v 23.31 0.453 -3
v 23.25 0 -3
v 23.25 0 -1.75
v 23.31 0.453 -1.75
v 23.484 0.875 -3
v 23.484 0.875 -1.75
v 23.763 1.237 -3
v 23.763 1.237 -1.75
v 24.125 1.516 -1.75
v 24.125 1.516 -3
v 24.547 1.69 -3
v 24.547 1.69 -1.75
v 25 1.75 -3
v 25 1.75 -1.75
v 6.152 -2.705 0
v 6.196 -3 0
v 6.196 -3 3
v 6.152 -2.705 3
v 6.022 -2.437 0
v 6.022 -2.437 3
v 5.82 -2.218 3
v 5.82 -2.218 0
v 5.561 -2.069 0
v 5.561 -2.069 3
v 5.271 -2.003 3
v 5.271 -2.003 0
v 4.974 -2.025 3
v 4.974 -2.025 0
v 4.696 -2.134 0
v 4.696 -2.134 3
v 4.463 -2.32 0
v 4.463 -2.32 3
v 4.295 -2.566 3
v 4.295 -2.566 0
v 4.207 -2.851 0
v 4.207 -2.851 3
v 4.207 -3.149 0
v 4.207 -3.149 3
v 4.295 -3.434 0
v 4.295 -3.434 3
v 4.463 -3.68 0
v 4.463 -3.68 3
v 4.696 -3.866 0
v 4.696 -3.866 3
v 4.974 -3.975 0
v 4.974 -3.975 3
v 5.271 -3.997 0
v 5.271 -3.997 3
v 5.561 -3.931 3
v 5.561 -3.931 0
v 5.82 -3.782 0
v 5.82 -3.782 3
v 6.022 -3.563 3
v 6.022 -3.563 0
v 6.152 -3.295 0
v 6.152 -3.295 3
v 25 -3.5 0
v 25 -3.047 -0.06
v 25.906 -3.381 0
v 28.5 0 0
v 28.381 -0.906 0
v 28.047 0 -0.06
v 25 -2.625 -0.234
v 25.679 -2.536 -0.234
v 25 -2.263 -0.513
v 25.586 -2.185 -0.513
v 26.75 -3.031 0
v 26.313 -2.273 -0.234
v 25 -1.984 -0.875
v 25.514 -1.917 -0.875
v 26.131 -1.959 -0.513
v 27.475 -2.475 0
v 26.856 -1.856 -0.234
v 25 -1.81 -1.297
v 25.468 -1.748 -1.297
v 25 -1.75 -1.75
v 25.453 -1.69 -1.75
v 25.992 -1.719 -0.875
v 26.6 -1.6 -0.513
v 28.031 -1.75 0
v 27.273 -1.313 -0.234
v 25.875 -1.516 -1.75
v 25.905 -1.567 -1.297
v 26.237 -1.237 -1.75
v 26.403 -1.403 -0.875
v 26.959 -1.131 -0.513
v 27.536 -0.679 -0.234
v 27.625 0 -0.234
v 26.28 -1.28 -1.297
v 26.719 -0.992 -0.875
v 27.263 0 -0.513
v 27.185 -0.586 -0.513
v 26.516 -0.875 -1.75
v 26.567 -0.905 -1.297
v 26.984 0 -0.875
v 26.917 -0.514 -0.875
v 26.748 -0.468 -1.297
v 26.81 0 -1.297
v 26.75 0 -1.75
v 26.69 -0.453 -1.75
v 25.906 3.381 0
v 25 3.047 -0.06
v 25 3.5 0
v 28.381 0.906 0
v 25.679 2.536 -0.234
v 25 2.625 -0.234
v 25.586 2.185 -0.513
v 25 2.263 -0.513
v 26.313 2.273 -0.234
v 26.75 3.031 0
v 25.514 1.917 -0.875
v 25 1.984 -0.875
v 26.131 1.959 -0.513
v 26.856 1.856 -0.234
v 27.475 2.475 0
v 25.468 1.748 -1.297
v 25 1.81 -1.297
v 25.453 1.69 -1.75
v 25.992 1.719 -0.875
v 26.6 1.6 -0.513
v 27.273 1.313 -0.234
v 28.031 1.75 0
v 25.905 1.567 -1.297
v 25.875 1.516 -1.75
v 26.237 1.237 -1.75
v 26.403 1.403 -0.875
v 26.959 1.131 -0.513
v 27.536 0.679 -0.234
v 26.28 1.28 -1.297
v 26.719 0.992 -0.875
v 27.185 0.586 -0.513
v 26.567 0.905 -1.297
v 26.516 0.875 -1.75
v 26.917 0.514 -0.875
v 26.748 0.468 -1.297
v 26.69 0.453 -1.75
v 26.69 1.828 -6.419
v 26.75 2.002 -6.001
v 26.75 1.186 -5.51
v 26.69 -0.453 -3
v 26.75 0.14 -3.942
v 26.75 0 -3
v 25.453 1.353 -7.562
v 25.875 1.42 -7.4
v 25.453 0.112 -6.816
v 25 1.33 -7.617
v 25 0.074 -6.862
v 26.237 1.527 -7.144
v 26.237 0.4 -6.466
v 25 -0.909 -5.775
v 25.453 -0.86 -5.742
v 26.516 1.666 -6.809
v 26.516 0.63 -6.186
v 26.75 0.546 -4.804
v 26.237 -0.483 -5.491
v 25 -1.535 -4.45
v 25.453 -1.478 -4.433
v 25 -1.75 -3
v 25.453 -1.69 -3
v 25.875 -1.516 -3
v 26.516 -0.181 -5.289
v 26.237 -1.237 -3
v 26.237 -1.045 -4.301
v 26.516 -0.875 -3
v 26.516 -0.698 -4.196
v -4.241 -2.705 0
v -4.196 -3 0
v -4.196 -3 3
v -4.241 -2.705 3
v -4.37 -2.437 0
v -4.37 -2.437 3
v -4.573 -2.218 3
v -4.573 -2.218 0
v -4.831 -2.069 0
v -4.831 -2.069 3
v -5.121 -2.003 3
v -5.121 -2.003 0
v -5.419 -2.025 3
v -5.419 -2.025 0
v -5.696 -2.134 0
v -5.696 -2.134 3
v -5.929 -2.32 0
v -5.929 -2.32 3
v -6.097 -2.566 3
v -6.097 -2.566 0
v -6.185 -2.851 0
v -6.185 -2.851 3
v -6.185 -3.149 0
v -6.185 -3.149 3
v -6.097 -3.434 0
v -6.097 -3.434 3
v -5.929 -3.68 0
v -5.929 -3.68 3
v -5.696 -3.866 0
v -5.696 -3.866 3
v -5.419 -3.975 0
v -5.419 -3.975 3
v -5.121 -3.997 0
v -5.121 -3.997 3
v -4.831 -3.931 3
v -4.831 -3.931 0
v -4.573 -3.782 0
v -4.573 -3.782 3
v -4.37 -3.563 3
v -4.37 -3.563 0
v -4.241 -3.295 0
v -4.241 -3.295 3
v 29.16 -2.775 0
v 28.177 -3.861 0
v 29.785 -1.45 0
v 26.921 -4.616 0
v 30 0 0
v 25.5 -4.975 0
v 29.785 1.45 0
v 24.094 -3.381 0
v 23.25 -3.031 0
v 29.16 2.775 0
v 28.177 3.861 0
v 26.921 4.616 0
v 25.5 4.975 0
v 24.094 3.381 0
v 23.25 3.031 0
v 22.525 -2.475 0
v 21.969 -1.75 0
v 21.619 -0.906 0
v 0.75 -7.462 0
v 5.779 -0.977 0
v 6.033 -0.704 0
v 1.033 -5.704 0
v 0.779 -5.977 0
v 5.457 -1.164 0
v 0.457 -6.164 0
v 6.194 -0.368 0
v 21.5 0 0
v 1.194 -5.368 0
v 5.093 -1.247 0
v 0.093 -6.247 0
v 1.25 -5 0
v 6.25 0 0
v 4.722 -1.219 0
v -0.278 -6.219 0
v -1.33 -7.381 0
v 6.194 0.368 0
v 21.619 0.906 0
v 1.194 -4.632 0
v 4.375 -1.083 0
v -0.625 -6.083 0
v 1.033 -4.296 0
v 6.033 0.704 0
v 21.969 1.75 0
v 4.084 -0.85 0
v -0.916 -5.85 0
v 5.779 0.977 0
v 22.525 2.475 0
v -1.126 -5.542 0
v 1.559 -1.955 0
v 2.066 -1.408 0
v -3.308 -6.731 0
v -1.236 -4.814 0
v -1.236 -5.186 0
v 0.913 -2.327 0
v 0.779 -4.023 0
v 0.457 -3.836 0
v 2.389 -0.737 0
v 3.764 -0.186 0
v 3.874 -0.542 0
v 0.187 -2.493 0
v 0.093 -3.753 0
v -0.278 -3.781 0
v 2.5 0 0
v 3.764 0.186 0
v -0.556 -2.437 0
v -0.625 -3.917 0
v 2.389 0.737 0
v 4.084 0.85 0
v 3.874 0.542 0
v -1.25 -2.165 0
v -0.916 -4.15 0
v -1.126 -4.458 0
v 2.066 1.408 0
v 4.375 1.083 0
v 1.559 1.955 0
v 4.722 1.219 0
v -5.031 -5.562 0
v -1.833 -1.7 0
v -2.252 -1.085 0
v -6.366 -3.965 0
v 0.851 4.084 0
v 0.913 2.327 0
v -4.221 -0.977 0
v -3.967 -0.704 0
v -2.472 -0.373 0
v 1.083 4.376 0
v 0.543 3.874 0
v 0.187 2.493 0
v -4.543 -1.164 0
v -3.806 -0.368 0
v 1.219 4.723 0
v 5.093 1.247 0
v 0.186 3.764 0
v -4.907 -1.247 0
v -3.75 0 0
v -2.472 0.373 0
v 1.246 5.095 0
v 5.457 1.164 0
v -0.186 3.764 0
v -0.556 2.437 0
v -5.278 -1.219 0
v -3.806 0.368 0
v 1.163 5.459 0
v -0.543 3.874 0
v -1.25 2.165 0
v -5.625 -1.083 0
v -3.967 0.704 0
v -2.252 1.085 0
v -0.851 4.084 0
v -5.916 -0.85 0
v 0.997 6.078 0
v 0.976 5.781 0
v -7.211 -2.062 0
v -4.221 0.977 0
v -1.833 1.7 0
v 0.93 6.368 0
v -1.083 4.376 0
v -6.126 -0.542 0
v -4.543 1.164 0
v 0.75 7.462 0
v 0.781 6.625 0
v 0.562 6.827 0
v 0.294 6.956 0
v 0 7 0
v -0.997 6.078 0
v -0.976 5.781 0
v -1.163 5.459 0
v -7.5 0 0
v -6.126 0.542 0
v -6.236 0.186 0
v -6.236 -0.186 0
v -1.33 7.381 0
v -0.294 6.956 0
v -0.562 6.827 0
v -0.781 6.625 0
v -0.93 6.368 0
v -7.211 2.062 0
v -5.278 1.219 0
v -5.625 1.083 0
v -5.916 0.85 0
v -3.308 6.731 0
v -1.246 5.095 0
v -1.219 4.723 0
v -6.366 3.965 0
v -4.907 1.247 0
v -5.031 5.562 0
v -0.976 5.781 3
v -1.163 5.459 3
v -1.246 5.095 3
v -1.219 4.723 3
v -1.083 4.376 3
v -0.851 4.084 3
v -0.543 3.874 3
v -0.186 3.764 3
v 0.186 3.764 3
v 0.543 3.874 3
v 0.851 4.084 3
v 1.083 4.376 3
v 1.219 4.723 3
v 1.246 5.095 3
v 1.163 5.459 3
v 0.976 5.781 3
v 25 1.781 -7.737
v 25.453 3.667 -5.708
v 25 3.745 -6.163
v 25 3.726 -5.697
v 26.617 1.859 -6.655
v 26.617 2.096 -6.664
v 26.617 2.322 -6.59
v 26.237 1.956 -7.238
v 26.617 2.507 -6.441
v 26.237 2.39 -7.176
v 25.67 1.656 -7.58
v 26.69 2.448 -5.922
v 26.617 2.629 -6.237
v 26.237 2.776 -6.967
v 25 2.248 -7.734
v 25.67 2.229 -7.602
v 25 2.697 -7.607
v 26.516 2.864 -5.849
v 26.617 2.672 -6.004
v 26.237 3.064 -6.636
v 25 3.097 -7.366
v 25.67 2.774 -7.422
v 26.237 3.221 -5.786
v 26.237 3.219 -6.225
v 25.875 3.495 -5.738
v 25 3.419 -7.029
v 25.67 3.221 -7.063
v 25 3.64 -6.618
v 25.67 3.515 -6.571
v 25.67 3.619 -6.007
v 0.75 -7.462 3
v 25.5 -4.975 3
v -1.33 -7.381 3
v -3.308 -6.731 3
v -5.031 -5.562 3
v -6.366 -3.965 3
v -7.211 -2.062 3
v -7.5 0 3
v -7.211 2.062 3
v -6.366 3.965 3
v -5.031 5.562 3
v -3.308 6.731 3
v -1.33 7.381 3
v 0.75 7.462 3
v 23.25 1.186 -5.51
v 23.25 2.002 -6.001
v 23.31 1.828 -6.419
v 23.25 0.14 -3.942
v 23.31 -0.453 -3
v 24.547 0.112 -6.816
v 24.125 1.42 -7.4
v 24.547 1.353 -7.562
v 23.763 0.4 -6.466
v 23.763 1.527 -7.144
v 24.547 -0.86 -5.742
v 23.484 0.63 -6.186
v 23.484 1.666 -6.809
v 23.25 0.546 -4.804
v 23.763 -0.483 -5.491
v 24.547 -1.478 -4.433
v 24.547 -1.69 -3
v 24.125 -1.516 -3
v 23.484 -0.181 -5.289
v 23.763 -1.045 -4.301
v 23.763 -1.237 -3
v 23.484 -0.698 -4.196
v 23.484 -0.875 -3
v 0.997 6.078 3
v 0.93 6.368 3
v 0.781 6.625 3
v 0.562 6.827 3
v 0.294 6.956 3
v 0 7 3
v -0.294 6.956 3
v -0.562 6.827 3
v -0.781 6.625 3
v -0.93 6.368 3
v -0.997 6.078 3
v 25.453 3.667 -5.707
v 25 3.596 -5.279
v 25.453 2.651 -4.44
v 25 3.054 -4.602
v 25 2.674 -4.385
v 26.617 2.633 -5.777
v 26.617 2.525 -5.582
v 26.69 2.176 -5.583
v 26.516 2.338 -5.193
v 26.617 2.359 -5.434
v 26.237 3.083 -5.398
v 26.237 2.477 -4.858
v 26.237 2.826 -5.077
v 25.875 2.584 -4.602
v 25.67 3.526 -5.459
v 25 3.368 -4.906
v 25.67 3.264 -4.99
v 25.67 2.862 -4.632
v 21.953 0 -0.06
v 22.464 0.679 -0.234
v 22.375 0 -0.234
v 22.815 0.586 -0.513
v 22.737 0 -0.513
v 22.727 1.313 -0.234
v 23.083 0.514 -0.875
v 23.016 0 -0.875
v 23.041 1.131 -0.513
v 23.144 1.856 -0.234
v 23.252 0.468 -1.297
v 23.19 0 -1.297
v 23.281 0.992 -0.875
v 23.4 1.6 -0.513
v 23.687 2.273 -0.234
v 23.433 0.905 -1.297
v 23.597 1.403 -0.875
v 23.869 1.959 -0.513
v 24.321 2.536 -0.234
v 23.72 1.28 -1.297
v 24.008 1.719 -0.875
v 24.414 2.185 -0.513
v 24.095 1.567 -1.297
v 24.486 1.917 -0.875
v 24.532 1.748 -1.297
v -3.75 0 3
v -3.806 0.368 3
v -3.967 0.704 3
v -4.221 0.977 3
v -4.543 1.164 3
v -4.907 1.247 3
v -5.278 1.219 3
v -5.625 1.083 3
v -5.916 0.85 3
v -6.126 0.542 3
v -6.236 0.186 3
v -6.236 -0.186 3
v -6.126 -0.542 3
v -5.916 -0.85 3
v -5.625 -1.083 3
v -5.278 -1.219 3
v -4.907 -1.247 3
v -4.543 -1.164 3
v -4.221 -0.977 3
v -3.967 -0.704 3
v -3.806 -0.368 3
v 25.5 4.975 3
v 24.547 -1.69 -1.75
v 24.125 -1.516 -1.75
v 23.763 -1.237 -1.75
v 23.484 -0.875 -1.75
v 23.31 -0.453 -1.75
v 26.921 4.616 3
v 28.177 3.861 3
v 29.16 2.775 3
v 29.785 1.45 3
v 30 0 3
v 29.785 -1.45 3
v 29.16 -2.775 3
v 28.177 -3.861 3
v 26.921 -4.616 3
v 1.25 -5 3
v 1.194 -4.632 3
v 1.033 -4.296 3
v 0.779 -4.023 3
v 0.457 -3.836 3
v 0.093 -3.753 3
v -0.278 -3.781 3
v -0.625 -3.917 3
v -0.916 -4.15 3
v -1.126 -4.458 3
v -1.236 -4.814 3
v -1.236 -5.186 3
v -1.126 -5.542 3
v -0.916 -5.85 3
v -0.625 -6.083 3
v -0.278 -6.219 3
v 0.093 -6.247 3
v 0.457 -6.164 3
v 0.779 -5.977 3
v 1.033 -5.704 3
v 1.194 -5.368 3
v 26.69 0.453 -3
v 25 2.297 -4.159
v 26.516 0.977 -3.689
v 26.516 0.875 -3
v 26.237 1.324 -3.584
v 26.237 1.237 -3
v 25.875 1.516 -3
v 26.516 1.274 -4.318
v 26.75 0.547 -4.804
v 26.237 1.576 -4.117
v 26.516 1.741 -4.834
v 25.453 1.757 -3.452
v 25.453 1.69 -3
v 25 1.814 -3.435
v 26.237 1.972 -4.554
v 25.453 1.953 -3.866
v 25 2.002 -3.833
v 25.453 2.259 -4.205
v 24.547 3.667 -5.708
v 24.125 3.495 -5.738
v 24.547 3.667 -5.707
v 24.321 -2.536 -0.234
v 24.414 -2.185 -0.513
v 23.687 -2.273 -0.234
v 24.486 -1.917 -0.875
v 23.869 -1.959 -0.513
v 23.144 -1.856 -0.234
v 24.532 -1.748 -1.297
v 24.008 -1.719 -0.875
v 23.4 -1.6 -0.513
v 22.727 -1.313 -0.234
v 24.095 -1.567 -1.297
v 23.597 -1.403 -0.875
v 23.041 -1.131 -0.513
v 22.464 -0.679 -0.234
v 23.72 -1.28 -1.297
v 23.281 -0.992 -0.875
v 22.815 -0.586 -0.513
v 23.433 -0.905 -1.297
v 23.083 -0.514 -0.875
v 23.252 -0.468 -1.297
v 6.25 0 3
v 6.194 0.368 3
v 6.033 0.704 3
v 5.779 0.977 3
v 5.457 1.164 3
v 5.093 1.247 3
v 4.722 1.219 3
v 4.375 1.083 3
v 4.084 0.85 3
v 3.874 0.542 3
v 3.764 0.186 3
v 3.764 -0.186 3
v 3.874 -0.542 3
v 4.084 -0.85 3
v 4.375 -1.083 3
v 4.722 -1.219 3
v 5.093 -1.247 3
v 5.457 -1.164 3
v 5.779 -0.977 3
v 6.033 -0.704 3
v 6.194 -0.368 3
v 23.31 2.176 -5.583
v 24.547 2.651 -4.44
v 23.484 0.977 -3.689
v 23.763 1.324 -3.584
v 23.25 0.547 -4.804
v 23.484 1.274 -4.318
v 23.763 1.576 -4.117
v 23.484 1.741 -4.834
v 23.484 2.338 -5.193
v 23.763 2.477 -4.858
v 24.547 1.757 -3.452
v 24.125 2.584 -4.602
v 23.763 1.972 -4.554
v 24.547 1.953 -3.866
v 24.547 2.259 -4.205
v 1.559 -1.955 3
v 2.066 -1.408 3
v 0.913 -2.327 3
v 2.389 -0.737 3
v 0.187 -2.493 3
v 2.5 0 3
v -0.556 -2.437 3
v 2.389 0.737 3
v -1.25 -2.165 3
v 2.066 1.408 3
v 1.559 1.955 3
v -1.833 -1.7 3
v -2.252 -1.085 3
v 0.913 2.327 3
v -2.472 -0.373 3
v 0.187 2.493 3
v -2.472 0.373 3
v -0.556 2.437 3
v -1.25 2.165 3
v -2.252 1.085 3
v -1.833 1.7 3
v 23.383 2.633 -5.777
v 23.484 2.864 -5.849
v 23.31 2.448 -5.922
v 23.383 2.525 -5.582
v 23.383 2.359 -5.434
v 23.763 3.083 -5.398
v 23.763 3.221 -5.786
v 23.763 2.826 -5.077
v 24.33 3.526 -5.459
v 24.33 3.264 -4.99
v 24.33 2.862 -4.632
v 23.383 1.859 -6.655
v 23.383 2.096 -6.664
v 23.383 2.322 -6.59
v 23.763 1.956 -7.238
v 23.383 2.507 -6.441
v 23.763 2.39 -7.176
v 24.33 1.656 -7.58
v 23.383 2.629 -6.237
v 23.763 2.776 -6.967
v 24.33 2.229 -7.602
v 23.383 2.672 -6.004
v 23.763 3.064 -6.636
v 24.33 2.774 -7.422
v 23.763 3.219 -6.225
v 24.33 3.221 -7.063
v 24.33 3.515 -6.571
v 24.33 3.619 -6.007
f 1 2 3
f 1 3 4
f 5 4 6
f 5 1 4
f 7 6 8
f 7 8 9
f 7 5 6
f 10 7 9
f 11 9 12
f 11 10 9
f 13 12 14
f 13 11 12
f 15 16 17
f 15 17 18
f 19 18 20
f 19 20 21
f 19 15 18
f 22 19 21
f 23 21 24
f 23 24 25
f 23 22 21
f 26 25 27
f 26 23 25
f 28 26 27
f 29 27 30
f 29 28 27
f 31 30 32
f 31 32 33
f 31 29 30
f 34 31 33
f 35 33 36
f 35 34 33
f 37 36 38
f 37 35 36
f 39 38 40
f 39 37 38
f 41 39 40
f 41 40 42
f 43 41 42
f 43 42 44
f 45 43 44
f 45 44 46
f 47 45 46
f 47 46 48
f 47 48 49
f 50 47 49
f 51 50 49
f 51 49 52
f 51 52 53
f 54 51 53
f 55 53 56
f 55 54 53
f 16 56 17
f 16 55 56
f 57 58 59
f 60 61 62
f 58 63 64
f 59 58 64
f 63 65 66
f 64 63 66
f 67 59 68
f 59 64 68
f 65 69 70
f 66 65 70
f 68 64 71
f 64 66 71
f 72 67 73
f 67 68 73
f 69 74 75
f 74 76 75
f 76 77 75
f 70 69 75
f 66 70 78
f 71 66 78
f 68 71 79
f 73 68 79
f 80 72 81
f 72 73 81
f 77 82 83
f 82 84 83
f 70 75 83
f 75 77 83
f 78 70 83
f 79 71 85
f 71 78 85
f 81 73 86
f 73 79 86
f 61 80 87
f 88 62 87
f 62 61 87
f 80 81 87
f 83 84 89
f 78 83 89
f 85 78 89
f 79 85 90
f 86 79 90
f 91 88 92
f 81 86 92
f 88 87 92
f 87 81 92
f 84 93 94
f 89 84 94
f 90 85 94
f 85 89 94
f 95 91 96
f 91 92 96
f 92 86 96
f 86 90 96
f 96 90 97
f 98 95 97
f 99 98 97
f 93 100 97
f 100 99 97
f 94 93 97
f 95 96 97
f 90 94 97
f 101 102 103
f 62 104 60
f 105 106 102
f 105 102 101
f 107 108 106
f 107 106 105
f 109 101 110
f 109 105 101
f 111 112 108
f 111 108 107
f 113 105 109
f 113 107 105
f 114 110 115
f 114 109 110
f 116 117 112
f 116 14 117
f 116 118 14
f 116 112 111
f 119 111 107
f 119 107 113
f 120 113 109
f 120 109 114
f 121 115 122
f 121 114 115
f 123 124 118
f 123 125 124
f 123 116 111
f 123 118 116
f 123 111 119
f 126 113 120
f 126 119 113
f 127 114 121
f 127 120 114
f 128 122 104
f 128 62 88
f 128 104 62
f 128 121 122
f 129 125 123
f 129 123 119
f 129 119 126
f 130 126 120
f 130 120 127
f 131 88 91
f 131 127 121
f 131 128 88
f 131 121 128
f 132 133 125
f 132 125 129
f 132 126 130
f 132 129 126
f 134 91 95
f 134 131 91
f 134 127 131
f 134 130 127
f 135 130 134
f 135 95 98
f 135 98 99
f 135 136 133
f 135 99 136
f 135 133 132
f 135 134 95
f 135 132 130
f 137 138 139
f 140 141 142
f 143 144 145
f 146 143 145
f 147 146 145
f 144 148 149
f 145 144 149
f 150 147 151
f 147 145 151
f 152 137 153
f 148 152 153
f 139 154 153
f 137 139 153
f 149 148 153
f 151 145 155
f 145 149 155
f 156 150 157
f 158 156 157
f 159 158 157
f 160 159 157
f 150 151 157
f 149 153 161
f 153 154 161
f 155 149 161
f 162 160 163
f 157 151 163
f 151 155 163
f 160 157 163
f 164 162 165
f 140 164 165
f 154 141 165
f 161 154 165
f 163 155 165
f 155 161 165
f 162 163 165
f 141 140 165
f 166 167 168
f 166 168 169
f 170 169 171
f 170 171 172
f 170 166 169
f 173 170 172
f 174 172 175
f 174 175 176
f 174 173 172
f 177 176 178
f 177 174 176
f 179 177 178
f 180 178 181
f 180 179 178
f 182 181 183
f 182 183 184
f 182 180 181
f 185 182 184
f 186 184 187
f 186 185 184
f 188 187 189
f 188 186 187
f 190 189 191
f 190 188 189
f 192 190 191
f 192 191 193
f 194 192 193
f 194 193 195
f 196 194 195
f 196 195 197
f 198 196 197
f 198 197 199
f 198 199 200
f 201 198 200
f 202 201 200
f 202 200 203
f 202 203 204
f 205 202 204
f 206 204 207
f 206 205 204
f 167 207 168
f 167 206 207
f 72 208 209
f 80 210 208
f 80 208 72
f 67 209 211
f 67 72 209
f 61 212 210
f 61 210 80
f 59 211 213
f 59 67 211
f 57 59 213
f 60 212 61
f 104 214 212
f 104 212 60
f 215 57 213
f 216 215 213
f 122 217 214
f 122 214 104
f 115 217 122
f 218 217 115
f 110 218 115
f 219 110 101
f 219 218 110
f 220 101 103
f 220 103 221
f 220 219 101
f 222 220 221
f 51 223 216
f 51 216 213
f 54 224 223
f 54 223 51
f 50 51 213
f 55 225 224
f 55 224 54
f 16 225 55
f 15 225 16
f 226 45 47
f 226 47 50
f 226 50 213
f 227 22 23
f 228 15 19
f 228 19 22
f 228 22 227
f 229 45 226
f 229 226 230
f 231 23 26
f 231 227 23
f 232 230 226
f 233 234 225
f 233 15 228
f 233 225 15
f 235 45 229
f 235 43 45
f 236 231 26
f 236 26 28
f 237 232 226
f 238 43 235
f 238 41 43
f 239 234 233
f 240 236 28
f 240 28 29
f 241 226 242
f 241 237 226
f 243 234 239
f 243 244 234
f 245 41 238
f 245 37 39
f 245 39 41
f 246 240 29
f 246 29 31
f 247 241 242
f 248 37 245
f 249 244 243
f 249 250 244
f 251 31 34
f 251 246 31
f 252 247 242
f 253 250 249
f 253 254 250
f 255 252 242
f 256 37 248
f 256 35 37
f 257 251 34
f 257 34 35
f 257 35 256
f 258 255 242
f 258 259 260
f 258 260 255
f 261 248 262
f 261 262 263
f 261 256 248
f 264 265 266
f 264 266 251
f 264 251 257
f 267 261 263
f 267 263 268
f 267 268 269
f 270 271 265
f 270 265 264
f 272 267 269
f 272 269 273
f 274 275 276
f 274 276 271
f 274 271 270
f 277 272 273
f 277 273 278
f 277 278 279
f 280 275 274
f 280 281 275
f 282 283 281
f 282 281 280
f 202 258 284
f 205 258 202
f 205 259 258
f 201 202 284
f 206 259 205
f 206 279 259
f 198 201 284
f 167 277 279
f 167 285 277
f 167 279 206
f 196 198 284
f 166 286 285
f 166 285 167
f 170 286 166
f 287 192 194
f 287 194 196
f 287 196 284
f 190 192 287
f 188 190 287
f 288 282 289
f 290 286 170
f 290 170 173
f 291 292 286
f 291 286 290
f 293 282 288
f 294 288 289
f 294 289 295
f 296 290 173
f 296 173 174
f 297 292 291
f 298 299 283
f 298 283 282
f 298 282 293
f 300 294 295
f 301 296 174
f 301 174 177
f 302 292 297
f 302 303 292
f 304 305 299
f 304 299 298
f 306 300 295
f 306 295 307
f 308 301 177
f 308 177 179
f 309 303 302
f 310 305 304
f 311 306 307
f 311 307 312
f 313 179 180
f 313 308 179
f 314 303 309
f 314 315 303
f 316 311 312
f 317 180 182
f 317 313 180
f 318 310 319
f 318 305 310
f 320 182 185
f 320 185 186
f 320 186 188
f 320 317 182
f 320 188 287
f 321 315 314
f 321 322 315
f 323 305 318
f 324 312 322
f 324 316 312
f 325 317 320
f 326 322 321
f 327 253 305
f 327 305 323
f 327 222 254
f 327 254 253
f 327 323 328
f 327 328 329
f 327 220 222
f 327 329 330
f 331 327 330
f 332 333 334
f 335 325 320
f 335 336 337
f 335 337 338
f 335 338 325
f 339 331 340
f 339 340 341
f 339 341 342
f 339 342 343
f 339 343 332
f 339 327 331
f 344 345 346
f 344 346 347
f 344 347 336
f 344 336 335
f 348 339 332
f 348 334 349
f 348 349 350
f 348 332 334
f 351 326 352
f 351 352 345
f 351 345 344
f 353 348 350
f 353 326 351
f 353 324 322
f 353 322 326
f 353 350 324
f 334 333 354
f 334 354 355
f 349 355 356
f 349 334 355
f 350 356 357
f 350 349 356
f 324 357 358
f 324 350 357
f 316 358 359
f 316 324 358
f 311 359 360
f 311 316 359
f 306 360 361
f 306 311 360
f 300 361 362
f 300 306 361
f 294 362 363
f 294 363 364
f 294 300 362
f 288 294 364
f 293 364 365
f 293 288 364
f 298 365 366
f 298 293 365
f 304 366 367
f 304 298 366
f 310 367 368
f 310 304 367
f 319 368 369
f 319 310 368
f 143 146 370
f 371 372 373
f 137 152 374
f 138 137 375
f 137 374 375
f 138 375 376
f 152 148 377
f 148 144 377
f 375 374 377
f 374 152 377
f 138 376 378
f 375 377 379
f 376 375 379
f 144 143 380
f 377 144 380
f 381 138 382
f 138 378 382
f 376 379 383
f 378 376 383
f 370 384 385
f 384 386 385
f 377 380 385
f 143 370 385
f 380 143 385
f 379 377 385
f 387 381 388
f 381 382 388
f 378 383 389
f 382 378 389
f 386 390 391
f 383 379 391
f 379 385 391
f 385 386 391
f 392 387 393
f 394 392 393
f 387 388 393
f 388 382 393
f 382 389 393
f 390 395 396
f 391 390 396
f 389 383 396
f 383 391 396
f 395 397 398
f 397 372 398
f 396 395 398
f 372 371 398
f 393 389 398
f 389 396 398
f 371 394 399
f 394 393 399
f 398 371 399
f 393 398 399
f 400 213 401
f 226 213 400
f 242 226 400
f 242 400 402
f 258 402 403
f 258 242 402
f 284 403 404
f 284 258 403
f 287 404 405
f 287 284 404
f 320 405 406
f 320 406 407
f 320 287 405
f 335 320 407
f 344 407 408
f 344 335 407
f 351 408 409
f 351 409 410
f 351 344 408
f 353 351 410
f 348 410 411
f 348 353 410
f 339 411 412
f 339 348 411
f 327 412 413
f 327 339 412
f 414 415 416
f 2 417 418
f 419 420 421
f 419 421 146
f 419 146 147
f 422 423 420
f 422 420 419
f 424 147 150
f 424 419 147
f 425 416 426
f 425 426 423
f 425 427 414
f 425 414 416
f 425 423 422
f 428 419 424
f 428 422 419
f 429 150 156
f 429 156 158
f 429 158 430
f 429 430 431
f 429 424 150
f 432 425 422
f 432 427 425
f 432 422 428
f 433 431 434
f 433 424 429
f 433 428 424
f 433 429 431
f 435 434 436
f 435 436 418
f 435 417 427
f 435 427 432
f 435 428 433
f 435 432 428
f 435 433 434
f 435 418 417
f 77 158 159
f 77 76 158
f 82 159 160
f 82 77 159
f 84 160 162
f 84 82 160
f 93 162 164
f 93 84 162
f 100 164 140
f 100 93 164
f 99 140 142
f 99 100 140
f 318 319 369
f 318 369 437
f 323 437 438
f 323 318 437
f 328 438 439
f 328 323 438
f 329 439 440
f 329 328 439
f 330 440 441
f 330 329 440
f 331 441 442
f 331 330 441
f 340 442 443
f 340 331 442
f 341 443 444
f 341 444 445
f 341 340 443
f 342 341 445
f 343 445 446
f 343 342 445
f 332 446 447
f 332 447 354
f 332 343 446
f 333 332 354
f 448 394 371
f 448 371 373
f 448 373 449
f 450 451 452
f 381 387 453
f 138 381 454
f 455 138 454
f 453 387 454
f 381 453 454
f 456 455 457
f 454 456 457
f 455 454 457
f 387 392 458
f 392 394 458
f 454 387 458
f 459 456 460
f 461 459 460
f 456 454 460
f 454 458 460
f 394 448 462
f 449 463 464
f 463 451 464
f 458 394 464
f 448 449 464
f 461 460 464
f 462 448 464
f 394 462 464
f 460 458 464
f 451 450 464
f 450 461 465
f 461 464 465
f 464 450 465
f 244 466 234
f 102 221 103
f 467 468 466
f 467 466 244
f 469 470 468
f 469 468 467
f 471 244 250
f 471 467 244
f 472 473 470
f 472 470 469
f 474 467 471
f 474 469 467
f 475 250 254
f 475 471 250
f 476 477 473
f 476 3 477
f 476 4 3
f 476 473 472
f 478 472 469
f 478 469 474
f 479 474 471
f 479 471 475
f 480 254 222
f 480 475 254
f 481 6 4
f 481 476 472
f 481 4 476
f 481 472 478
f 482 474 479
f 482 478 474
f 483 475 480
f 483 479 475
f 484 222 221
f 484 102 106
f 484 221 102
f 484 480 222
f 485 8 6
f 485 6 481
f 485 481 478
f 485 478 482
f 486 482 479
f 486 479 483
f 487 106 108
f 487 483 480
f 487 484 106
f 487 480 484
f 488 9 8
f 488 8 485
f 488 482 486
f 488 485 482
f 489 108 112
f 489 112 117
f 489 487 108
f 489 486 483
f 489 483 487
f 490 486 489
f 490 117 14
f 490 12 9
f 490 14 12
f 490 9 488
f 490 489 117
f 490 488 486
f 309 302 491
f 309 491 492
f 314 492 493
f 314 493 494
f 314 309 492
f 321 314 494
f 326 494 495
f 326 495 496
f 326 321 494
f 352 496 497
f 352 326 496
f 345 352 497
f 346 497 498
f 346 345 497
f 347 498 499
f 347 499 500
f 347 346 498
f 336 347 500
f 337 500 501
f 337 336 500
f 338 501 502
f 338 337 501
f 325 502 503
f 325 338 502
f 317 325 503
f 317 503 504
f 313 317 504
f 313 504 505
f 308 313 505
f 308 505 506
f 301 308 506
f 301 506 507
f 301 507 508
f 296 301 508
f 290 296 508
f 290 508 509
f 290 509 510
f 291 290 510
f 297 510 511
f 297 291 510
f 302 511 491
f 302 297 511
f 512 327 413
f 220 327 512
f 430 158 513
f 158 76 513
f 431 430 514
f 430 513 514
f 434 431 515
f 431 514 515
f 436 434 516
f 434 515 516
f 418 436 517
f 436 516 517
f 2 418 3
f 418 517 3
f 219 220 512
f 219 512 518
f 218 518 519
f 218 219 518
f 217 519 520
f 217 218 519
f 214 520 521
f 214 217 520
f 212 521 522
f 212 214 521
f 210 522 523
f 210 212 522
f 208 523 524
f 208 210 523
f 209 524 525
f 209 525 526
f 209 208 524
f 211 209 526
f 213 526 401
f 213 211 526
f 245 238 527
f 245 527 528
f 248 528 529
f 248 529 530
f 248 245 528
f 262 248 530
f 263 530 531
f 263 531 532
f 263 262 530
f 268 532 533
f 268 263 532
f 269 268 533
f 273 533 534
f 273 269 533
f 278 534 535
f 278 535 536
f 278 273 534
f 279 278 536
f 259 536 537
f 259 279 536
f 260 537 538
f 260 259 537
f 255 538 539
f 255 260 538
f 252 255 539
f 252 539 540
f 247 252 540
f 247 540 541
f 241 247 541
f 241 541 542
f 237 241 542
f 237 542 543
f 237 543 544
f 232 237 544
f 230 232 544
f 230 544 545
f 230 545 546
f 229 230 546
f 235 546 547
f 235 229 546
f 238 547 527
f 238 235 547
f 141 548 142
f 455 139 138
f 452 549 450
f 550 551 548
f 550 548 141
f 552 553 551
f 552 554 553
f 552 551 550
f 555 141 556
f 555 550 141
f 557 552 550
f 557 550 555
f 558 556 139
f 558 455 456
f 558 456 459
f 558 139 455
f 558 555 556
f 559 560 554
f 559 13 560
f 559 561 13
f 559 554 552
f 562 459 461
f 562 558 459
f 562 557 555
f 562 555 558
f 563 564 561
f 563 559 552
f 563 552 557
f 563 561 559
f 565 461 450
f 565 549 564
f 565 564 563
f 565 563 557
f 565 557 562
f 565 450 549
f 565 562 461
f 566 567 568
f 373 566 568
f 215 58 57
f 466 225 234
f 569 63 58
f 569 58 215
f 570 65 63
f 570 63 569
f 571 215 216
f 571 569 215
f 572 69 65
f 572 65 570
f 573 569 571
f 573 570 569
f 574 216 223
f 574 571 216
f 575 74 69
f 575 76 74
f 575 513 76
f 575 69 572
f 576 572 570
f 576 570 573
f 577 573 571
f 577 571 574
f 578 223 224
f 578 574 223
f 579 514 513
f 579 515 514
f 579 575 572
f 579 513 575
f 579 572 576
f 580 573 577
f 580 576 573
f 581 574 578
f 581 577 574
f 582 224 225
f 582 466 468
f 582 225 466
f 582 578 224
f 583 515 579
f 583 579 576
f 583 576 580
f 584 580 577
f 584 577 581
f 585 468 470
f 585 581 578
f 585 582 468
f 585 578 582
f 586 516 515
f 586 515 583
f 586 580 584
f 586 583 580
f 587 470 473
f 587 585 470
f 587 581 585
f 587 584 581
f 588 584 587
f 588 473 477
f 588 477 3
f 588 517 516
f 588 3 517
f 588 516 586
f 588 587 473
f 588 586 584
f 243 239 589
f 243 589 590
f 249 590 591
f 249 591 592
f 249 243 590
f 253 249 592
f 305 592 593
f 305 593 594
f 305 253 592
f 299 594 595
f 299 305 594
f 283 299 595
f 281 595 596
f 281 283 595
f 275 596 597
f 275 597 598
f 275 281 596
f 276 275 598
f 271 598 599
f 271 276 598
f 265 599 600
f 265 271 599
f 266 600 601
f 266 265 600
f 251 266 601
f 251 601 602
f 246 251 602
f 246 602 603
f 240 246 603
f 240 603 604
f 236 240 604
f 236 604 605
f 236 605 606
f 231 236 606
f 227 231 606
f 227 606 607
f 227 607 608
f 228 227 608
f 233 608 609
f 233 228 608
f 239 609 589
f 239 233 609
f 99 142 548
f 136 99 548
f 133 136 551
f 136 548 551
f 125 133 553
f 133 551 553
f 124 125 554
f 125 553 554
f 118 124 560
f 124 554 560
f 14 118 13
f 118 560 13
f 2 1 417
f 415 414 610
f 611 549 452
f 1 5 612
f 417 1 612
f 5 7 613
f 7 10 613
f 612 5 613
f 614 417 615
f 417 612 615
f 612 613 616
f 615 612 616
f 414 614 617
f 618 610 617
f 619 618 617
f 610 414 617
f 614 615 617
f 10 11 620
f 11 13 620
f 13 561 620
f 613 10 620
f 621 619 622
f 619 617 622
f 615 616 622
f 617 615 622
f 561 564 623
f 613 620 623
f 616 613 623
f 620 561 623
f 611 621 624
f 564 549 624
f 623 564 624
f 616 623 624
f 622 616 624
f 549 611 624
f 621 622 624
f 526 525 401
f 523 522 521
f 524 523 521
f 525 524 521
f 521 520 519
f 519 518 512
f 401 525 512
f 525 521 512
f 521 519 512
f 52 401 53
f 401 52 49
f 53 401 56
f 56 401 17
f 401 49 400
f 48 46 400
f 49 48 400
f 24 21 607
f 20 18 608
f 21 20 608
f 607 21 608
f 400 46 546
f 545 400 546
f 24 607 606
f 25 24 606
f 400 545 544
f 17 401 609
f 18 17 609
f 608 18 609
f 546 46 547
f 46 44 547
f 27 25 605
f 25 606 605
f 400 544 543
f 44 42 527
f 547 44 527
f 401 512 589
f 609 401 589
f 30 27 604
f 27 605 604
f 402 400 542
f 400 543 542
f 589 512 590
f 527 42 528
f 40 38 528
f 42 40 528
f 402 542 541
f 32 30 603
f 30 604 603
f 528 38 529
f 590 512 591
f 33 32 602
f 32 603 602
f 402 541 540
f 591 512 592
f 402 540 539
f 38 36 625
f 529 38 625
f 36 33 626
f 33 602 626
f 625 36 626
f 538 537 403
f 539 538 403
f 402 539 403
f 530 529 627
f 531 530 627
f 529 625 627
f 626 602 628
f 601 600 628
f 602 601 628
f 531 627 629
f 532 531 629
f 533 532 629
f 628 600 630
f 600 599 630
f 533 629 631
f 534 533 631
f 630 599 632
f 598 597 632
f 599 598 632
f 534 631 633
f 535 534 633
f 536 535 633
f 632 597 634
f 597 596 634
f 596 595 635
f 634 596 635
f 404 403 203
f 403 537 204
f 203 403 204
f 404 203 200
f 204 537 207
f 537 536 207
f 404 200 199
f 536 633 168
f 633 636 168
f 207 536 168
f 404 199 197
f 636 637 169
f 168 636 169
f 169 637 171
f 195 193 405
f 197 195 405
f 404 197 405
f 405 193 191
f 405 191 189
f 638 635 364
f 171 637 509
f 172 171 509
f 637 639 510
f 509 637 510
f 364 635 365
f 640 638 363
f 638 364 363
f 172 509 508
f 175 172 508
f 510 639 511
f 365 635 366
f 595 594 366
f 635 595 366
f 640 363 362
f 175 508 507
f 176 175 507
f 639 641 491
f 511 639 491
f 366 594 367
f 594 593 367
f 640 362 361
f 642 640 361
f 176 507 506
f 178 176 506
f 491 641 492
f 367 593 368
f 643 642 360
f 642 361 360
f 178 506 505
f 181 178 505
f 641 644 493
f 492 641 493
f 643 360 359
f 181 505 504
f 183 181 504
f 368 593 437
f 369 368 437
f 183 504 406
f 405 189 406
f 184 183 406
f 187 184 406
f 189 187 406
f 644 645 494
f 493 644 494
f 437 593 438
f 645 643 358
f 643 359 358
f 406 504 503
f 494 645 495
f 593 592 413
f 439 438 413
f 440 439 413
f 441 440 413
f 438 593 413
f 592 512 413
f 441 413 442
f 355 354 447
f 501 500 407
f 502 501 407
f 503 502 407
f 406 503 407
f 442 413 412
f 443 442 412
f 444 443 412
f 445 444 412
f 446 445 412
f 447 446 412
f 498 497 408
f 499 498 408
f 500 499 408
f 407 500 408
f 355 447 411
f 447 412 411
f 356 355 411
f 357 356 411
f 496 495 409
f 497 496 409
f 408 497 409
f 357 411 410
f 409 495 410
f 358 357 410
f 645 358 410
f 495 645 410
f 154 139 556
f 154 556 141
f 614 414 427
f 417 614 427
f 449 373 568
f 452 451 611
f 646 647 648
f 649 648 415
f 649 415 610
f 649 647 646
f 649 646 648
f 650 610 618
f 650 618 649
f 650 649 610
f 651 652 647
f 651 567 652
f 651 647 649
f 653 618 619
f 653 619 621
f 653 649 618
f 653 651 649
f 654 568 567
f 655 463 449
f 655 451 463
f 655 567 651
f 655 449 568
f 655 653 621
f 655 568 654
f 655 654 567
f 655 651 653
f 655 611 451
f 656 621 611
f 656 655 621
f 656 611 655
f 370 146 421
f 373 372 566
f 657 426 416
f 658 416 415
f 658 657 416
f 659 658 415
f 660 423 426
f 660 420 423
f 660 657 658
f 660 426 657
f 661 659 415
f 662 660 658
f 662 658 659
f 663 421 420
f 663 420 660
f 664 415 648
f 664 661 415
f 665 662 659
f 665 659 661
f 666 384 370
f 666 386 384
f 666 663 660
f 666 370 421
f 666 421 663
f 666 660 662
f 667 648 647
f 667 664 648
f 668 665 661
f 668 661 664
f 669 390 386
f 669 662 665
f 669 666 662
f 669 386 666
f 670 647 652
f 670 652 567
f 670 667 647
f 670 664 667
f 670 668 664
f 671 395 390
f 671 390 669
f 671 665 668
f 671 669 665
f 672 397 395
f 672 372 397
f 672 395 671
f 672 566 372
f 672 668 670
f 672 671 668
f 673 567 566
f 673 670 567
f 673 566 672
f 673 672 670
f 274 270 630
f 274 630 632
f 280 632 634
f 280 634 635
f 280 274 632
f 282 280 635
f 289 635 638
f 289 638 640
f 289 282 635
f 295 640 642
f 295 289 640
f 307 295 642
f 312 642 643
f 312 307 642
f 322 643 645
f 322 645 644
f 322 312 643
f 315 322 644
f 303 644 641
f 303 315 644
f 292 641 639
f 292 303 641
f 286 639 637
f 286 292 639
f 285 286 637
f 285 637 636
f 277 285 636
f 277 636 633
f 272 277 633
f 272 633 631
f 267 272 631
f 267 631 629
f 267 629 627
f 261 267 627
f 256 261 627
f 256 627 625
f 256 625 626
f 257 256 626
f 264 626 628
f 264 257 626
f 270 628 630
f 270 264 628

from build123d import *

# Parameters (mm, degrees)
SKETCH_1_R      = 1.25
SKETCH_1_R_2    = 2.5
SKETCH_1_R_3    = 1
EXTRUDE_1_DEPTH = 3
EXTRUDE_2_DEPTH = 1.75
FILLET_1_R      = 1.75


with BuildPart() as part:
    # 草图1 → 凸台-拉伸1 (new body)
    with BuildSketch(Plane.XY):
        with BuildLine():
            Line((0.75, 7.462405778), (25.5, 4.974937186))
            ThreePointArc((25.5, 4.974937186), (30, 0), (25.5, -4.974937186))
            Line((25.5, -4.974937186), (0.75, -7.462405778))
            ThreePointArc((0.75, -7.462405778), (-7.5, 0), (0.75, 7.462405778))
        make_face()
        with Locations((5, 0)):
            Circle(SKETCH_1_R, mode=Mode.SUBTRACT)
        with Locations((0, -5)):
            Circle(SKETCH_1_R, mode=Mode.SUBTRACT)
        with Locations((-5, 0)):
            Circle(SKETCH_1_R, mode=Mode.SUBTRACT)
        Circle(SKETCH_1_R_2, mode=Mode.SUBTRACT)
        with Locations((5.196152423, -3)):
            Circle(SKETCH_1_R_3, mode=Mode.SUBTRACT)
        with Locations((-5.196152423, -3)):
            Circle(SKETCH_1_R_3, mode=Mode.SUBTRACT)
        with BuildLine():
            ThreePointArc((-0.975780937, 5.78125), (0, 3.75), (0.975780937, 5.78125))
            ThreePointArc((0.975780937, 5.78125), (0, 7), (-0.975780937, 5.78125))
        make_face(mode=Mode.SUBTRACT)
    extrude(amount=EXTRUDE_1_DEPTH)

    # 草图2 → 凸台-拉伸2 (add, symmetric)
    with BuildSketch(Plane(origin=(25, 0, 0), x_dir=(0, 0, -1), z_dir=(1, 0, 0))):
        with BuildLine():
            Line((3, -1.75), (0, -1.75))
            Line((0, -1.75), (0, 1.75))
            Line((0, 1.75), (3, 1.75))
            ThreePointArc((3, 1.75), (4.149066665, 2.285818585), (4.47721163, 3.510472267))
            Line((4.47721163, 3.510472267), (7.924038765, 4.118240888))
            ThreePointArc((7.924038765, 4.118240888), (6.830222216, 0.036061952), (3, -1.75))
        make_face()
    extrude(amount=EXTRUDE_2_DEPTH, both=True)

    # 圆角1
    fillet_1_edges = [part.edges().sort_by_distance(p)[0] for p in [
        (23.25, 0, 0),
        (25, 1.75, 0),
        (23.25, -1.75, -1.5),
        (25, -1.75, 0),
        (23.25, 0.036061952, -6.830222216),
        (25, -1.75, -3),
        (23.25, 3.814356577, -6.200625197),
        (25, 4.118240888, -7.924038765),
        (23.25, 2.285818585, -4.149066665),
        (25, 3.510472267, -4.47721163),
        (23.25, 1.75, -1.5),
        (25, 1.75, -3),
        (26.75, 0, 0),
        (26.75, -1.75, -1.5),
        (26.75, 0.036061952, -6.830222216),
        (26.75, 3.814356577, -6.200625197),
        (26.75, 2.285818585, -4.149066665),
        (26.75, 1.75, -1.5),
    ]]
    fillet(fillet_1_edges, radius=FILLET_1_R - 0.0001)  # a hair under: the kernel refuses the full size


solid = part.part
